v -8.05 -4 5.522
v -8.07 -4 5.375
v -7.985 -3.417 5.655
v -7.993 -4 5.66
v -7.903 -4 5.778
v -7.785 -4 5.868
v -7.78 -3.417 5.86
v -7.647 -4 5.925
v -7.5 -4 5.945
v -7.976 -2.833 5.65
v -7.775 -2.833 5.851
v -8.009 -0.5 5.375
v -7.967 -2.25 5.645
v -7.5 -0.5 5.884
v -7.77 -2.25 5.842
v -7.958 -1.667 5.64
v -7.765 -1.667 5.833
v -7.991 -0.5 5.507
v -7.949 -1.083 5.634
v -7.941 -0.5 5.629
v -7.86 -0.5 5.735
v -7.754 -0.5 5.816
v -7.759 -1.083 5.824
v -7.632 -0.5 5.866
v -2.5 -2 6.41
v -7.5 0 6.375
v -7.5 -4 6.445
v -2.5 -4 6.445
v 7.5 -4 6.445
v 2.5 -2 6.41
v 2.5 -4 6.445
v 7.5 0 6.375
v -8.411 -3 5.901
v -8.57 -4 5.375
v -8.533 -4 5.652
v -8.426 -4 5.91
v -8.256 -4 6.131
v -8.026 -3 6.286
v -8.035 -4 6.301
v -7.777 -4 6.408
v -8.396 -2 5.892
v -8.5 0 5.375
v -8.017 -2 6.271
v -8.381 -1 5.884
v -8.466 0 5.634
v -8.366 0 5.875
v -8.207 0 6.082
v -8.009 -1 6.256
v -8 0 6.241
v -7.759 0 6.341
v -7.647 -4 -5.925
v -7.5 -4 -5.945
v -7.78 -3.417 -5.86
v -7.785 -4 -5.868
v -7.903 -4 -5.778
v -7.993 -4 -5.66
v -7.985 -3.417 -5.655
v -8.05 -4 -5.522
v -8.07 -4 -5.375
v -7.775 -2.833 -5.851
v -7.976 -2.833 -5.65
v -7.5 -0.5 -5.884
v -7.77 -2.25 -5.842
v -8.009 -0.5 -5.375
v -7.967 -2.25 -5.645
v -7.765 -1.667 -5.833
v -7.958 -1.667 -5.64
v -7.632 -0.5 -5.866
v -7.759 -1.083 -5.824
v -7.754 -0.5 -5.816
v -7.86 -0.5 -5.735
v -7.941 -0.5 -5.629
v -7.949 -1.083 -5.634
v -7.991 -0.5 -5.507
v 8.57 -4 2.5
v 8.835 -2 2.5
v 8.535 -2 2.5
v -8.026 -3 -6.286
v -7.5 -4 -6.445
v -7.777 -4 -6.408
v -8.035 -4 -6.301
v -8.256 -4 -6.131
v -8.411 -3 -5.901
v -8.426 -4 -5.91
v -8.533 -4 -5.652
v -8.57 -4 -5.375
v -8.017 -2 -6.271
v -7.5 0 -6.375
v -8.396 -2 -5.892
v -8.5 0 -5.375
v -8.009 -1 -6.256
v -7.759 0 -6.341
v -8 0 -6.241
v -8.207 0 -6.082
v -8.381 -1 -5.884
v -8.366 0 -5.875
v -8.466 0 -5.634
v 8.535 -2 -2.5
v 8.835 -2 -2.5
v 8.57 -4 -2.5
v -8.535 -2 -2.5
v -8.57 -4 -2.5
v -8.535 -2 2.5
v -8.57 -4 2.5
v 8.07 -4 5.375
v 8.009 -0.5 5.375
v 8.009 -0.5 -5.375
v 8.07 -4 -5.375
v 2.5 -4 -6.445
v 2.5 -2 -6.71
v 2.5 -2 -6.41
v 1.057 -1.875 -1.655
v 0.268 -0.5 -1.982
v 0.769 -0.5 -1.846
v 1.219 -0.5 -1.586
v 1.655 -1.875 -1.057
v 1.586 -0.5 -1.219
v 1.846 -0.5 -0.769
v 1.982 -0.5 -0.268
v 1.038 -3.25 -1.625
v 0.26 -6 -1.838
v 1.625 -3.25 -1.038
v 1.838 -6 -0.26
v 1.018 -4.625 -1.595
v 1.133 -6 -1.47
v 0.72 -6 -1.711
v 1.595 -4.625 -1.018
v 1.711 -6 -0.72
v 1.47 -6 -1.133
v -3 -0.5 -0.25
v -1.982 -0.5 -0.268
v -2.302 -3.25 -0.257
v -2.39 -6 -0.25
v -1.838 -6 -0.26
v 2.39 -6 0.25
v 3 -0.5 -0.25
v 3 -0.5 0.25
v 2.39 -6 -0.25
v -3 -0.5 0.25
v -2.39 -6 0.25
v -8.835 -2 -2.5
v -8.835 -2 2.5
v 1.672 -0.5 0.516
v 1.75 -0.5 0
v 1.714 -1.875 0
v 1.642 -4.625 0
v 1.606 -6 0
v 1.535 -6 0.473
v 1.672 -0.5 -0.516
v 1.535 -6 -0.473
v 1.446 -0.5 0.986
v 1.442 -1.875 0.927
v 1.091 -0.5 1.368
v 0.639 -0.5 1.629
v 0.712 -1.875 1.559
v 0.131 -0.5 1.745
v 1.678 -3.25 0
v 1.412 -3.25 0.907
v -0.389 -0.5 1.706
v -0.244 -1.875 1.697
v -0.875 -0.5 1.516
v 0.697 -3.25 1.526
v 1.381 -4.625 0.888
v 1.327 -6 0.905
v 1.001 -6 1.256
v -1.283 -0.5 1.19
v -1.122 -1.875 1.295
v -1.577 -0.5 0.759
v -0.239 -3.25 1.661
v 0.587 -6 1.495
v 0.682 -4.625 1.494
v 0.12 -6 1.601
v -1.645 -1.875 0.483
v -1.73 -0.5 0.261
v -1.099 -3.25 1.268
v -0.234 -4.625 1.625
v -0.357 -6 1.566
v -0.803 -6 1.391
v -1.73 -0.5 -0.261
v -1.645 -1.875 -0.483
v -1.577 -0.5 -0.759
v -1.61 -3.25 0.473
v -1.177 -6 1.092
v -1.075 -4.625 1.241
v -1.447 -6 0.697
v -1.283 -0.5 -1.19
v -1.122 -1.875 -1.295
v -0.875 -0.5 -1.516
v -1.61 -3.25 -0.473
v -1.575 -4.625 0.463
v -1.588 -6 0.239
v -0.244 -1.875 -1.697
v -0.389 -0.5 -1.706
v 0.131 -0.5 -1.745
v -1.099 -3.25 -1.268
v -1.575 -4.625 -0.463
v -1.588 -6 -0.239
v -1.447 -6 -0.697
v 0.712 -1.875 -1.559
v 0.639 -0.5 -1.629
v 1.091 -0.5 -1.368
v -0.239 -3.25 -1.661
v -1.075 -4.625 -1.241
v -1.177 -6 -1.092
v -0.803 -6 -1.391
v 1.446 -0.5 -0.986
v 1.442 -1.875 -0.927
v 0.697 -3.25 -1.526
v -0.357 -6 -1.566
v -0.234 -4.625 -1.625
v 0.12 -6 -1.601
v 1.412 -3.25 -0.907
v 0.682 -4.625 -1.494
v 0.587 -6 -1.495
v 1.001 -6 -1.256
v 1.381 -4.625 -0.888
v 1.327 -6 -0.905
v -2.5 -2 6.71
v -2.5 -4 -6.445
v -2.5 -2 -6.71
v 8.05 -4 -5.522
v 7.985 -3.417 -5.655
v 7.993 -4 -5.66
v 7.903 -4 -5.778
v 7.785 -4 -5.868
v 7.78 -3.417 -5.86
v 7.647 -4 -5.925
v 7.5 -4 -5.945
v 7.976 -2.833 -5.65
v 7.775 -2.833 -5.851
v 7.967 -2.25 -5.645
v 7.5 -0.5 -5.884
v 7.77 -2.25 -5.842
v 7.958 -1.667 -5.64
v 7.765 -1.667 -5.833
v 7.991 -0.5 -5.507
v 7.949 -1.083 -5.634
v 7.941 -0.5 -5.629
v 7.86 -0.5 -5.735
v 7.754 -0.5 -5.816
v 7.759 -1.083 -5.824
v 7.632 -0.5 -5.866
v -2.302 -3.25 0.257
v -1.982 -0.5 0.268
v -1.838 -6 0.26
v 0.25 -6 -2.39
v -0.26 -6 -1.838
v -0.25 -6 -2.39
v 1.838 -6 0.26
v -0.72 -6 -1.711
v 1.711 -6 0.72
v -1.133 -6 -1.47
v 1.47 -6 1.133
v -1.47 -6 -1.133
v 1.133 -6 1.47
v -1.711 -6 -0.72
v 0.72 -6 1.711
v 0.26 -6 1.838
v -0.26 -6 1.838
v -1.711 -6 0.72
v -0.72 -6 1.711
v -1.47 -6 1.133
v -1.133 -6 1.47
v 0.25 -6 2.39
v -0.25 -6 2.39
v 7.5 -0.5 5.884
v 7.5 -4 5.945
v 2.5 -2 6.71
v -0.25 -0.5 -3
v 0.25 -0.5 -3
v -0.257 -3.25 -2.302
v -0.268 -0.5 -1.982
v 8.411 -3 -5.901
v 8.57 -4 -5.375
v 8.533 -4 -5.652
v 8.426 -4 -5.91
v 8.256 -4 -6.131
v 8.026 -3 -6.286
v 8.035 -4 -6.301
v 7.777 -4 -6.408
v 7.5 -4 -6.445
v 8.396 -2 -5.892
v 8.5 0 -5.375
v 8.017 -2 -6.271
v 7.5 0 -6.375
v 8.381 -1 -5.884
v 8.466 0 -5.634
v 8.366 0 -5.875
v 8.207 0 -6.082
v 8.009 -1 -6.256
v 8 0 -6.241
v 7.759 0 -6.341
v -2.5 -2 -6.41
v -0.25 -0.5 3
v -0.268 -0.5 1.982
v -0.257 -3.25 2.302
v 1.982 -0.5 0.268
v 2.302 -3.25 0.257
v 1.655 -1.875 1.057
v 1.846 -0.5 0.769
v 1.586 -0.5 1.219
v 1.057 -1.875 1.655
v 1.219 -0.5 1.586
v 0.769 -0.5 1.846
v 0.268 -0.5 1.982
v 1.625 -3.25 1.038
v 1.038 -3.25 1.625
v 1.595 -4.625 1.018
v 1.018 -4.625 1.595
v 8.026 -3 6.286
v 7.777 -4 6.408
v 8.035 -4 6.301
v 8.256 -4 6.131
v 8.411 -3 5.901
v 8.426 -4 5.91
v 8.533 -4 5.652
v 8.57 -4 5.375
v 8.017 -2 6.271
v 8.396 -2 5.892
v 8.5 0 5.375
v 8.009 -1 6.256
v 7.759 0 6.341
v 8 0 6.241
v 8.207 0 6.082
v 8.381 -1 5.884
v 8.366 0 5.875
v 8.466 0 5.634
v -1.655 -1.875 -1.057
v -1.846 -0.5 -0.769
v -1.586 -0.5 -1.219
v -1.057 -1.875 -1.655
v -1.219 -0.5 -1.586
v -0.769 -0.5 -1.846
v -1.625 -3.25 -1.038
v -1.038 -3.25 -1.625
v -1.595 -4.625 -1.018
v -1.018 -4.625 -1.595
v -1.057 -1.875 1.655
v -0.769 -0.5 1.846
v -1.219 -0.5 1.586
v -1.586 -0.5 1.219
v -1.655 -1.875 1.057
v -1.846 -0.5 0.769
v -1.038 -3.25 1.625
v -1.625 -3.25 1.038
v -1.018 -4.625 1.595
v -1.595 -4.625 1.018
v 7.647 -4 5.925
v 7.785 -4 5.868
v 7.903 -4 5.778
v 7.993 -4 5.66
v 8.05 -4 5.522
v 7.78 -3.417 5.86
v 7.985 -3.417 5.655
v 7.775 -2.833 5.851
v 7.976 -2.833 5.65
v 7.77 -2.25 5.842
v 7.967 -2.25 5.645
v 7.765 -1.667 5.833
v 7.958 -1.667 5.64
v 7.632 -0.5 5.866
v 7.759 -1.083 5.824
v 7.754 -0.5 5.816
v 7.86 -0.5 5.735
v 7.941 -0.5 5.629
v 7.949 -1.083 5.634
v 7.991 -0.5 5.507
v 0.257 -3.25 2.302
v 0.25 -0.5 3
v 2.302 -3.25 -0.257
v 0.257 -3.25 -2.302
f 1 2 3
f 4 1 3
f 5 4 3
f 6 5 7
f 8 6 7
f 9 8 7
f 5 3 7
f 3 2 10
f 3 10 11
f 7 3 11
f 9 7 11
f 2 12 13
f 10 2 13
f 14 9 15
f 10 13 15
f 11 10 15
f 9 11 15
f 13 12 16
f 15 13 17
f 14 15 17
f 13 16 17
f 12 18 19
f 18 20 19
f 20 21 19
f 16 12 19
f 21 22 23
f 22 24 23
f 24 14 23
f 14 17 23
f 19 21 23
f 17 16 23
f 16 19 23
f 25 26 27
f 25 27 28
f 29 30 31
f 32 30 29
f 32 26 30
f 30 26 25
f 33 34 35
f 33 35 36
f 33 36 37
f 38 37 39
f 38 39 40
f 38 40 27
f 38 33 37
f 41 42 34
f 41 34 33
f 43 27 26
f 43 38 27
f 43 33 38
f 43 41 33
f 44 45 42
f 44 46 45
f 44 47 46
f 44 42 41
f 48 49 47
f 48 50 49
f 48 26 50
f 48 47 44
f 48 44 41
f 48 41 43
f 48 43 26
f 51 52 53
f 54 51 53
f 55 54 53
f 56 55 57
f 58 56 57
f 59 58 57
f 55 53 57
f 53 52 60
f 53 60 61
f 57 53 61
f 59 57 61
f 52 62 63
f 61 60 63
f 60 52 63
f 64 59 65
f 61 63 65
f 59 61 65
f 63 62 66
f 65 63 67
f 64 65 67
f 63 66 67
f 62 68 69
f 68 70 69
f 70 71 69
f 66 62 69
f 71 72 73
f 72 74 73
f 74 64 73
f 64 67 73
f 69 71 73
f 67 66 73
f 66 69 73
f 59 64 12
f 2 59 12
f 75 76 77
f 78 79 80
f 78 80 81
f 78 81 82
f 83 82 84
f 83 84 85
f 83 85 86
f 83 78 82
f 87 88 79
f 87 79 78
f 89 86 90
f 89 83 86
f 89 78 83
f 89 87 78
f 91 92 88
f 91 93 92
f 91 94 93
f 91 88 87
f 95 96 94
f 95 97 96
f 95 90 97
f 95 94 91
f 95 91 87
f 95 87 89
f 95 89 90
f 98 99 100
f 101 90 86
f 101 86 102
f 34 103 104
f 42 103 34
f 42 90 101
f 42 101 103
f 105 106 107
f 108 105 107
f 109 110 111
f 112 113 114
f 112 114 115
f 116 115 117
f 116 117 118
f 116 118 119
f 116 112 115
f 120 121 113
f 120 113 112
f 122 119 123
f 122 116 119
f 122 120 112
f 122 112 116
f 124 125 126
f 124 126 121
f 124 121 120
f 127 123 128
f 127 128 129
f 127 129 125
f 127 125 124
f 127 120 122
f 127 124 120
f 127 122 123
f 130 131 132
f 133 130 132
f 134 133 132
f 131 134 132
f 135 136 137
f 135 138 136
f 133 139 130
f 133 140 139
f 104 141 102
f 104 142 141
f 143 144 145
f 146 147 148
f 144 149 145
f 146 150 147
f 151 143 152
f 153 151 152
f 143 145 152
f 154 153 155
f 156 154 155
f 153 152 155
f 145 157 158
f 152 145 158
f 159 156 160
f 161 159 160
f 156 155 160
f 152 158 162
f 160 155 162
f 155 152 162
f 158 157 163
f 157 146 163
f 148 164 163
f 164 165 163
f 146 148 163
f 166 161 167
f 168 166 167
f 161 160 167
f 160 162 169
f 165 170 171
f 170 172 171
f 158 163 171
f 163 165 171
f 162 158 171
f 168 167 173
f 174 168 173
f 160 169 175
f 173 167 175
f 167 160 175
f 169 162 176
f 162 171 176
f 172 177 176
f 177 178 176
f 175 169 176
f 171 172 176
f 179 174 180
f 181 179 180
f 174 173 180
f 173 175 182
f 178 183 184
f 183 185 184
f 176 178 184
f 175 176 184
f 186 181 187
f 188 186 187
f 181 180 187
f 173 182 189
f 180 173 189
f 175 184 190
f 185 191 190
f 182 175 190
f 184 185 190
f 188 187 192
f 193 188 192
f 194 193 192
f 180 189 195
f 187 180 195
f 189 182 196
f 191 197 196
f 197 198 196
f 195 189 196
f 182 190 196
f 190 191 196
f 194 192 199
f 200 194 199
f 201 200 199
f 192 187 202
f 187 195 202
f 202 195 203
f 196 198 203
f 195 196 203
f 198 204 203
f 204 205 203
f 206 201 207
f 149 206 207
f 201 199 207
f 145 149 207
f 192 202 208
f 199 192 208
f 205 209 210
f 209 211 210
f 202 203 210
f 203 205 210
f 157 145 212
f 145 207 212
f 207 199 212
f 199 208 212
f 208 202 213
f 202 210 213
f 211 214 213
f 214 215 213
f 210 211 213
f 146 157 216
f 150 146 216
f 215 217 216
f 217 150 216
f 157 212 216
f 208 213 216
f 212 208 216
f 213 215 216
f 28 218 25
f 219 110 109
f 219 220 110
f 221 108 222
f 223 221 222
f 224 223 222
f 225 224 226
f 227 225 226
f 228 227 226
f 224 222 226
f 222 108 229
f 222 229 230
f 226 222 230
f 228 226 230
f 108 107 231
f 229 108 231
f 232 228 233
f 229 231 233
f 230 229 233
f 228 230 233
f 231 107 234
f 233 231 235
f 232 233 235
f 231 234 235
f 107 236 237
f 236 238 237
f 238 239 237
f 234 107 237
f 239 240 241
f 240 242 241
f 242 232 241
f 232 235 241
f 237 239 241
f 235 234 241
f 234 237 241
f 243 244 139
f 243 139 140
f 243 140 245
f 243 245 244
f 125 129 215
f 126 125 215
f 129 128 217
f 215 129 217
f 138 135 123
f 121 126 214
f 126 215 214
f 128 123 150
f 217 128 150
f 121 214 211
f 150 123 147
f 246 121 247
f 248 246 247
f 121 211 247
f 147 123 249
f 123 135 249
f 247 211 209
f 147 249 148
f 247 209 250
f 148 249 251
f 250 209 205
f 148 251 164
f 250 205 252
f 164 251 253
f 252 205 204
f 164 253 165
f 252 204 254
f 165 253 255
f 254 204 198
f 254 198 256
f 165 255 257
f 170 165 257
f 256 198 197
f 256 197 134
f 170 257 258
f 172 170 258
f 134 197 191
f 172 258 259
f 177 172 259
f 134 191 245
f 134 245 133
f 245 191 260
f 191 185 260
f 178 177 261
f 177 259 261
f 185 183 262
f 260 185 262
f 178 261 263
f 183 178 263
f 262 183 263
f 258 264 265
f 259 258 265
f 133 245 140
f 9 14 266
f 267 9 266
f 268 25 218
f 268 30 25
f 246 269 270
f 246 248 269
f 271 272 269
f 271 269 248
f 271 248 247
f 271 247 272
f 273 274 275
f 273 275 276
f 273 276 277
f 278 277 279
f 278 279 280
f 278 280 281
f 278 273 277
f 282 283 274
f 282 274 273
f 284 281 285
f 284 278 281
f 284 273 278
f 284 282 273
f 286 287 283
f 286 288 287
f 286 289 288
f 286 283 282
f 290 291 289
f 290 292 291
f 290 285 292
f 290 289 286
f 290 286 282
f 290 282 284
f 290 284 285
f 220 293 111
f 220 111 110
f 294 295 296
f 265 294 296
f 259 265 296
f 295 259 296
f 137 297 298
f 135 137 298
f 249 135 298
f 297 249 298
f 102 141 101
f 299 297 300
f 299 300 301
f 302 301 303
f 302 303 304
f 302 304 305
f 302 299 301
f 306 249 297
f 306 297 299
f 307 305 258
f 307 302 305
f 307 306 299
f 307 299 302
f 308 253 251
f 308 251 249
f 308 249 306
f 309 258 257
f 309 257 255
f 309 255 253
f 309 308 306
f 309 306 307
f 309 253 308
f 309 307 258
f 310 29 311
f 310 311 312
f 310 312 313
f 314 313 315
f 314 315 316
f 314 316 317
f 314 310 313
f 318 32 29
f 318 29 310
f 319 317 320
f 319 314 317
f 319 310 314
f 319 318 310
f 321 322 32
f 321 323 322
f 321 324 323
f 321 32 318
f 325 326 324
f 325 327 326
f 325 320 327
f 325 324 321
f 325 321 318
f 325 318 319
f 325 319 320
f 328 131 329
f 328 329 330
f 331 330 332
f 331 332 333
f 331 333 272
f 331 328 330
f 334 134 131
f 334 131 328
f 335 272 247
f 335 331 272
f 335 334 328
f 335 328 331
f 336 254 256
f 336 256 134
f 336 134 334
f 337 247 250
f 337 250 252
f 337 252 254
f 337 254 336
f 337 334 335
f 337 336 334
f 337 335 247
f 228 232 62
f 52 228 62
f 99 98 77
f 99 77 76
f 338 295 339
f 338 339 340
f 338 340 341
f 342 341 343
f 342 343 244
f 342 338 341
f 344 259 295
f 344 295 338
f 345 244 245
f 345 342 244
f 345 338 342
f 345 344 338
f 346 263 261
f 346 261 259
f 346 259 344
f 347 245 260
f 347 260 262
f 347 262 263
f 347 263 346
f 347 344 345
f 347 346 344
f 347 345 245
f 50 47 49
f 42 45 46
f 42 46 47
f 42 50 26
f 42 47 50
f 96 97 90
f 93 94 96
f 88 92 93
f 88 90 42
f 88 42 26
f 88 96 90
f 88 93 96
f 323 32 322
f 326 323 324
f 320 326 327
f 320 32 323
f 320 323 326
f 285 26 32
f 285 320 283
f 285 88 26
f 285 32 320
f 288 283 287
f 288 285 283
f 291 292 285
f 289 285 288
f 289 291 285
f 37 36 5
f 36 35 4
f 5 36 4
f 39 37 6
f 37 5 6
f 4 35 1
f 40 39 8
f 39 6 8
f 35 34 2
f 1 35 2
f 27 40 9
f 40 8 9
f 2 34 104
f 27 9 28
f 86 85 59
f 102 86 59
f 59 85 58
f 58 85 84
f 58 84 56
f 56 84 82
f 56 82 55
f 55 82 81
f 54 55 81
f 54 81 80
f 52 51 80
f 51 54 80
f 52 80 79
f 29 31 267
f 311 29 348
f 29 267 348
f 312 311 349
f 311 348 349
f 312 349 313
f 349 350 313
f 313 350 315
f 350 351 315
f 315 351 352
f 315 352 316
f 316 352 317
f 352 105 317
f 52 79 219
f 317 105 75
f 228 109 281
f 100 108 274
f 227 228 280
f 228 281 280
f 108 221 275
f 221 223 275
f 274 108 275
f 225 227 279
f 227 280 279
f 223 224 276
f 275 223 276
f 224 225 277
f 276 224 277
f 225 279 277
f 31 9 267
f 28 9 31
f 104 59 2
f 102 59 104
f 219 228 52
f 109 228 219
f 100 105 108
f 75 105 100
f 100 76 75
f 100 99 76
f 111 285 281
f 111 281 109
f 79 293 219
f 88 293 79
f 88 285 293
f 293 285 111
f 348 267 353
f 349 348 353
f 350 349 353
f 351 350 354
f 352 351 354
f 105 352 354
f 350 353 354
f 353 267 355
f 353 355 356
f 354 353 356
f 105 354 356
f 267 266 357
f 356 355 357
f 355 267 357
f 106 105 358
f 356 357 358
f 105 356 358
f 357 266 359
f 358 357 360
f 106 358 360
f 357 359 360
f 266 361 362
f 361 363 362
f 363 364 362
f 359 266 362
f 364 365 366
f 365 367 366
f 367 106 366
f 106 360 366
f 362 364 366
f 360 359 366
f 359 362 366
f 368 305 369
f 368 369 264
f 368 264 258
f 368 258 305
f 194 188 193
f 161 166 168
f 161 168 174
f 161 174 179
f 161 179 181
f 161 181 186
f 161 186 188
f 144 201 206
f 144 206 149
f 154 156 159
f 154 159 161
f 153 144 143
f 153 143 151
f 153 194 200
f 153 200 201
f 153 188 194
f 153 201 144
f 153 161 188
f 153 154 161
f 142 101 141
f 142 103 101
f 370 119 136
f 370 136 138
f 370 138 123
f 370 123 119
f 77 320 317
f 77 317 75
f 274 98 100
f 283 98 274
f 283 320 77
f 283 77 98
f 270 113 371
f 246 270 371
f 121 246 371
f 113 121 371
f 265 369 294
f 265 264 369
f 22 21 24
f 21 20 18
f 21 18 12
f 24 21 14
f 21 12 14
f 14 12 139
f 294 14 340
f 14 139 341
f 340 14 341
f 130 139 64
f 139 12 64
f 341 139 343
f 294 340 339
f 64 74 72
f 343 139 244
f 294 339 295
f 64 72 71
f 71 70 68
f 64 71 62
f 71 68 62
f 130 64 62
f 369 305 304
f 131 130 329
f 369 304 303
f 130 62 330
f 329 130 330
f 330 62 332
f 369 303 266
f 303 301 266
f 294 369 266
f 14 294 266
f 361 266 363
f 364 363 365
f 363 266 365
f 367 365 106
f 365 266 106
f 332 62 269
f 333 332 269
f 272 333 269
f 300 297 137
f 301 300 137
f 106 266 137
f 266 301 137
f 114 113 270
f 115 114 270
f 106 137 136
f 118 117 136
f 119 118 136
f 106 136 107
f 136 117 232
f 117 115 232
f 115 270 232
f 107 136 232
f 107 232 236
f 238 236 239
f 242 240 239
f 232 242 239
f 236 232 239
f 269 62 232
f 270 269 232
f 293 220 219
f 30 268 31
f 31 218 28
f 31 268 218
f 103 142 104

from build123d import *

# Parameters (mm, degrees)
BOSS_EXTRUDE1_DEPTH = 4
BOSS_EXTRUDE1_DRAFT = 1
SHELL1_T            = -0.5
SKETCH2_R           = 2
BOSS_EXTRUDE2_DEPTH = 5.5
BOSS_EXTRUDE2_TAPER = 1.5
CIRPATTERN1_COUNT   = 4
SKETCH4_R           = 1.605977431
CUT_EXTRUDE1_DEPTH  = 5.5
CUT_EXTRUDE1_DRAFT  = 1.5
BOSS_EXTRUDE3_DEPTH = 2.5
BOSS_EXTRUDE4_DEPTH = 2.5


with BuildPart() as part:
    # Sketch1 → Boss-Extrude1 (with draft: the straight prism first)
    with BuildSketch(Plane(origin=(0, 0, 0), x_dir=(1, 0, 0), z_dir=(0, 1, 0))):
        with BuildLine():
            Line((-7.5, -6.375), (7.5, -6.375))
            ThreePointArc((7.5, -6.375), (8.207106781, -6.082106781), (8.5, -5.375))
            Line((8.5, -5.375), (8.5, 5.375))
            ThreePointArc((8.5, 5.375), (8.207106781, 6.082106781), (7.5, 6.375))
            Line((7.5, 6.375), (-7.5, 6.375))
            ThreePointArc((-7.5, 6.375), (-8.207106781, 6.082106781), (-8.5, 5.375))
            Line((-8.5, 5.375), (-8.5, -5.375))
            ThreePointArc((-8.5, -5.375), (-8.207106781, -6.082106781), (-7.5, -6.375))
        make_face()
    extrude(amount=-BOSS_EXTRUDE1_DEPTH)
    # Boss-Extrude1: the draft: its side faces are tilted about the plane it starts from
    boss_extrude1_sides = [part.faces().sort_by_distance(p)[0] for p in [
        (0, -2, 6.375),
        (8.207106781, -2, 6.082106781),
        (8.5, -2, 0),
        (8.207106781, -2, -6.082106781),
        (0, -2, -6.375),
        (-8.207106781, -2, -6.082106781),
        (-8.5, -2, 0),
        (-8.207106781, -2, 6.082106781),
    ]]
    draft(boss_extrude1_sides, Plane(origin=(0, 0, 0), x_dir=(1, 0, 0), z_dir=(0, 1, 0)), BOSS_EXTRUDE1_DRAFT)

    # Shell1
    shell1_openings = [part.faces().sort_by_distance(p)[0] for p in [
        (0, -4, 0),
    ]]
    offset(amount=SHELL1_T, openings=shell1_openings, kind=Kind.INTERSECTION)

    # Sketch2 → Boss-Extrude2 (add)
    with BuildSketch(Plane.XZ.offset(0.5)):
        Circle(SKETCH2_R)
    extrude(amount=BOSS_EXTRUDE2_DEPTH, taper=BOSS_EXTRUDE2_TAPER)

    # Rib1: read off the stored shape, not the designer's step
    # Rib1: loft between two sections, ruled curve by curve
    rib1_from = [
        Edge.make_line((1.98200852, -0.5, 0.267660658), (3, -0.5, 0.25)),
        Edge.make_line((1.98200852, -0.5, -0.267660658), (3, -0.5, -0.25)),
        Edge.make_line((3, -0.5, -0.25), (3, -0.5, 0.25)),
        Edge.make_line((1.98200852, -0.5, -0.267660658), (1.98200852, -0.5, 0.267660658)),
    ]
    rib1_to = [
        Edge.make_line((1.837736121, -6, 0.25957306), (2.389544218, -6, 0.25)),
        Edge.make_line((1.837736121, -6, -0.25957306), (2.389544218, -6, -0.25)),
        Edge.make_line((2.389544218, -6, -0.25), (2.389544218, -6, 0.25)),
        Edge.make_line((1.837736121, -6, -0.25957306), (1.837736121, -6, 0.25957306)),
    ]
    rib1 = Solid(Shell([*[Face.make_surface_from_curves(rib1_from[k], rib1_to[k]) for k in range(4)], Face(Wire(rib1_from)), Face(Wire(rib1_to))]))
    add(rib1)

    # CirPattern1: Rib1 ×4 about axis
    cirpattern1_axis = Axis((0, 0, 0), (0, 1, 0))
    for i in range(1, CIRPATTERN1_COUNT):
        add(rib1.rotate(cirpattern1_axis, i * 360 / CIRPATTERN1_COUNT))


with BuildPart() as cut_extrude1_tool:
    # Sketch4 → Cut-Extrude1 (with draft: the straight prism first)
    with BuildSketch(Plane.XZ.offset(6)):
        Circle(SKETCH4_R)
    extrude(amount=-CUT_EXTRUDE1_DEPTH)
    # Cut-Extrude1: the draft: its side faces are tilted about the plane it starts from
    cut_extrude1_sides = [cut_extrude1_tool.faces().sort_by_distance(p)[0] for p in [
        (-1.605977431, -3.25, 0),
    ]]
    draft(cut_extrude1_sides, Plane.XZ.offset(6), CUT_EXTRUDE1_DRAFT)


with BuildPart() as part_1:
    add(part.part)

    # Cut-Extrude1: cut by cut_extrude1_tool
    add(cut_extrude1_tool.part, mode=Mode.SUBTRACT)

    # Sketch5 → Boss-Extrude3 (add, symmetric)
    with BuildSketch(Plane(origin=(0, 0, 0), x_dir=(0, 0, -1), z_dir=(1, 0, 0))):
        Polygon((6.44482026, -4), (6.40991013, -2), (6.70991013, -2), align=None)
        Polygon((-6.70991013, -2), (-6.44482026, -4), (-6.40991013, -2), align=None)
    extrude(amount=BOSS_EXTRUDE3_DEPTH, both=True)

    # Sketch6 → Boss-Extrude4 (add, symmetric)
    with BuildSketch(Plane.XY):
        Polygon((8.56982026, -4), (8.53491013, -2), (8.83491013, -2), align=None)
        Polygon((-8.83491013, -2), (-8.56982026, -4), (-8.53491013, -2), align=None)
    extrude(amount=BOSS_EXTRUDE4_DEPTH, both=True)


solid = part_1.part
